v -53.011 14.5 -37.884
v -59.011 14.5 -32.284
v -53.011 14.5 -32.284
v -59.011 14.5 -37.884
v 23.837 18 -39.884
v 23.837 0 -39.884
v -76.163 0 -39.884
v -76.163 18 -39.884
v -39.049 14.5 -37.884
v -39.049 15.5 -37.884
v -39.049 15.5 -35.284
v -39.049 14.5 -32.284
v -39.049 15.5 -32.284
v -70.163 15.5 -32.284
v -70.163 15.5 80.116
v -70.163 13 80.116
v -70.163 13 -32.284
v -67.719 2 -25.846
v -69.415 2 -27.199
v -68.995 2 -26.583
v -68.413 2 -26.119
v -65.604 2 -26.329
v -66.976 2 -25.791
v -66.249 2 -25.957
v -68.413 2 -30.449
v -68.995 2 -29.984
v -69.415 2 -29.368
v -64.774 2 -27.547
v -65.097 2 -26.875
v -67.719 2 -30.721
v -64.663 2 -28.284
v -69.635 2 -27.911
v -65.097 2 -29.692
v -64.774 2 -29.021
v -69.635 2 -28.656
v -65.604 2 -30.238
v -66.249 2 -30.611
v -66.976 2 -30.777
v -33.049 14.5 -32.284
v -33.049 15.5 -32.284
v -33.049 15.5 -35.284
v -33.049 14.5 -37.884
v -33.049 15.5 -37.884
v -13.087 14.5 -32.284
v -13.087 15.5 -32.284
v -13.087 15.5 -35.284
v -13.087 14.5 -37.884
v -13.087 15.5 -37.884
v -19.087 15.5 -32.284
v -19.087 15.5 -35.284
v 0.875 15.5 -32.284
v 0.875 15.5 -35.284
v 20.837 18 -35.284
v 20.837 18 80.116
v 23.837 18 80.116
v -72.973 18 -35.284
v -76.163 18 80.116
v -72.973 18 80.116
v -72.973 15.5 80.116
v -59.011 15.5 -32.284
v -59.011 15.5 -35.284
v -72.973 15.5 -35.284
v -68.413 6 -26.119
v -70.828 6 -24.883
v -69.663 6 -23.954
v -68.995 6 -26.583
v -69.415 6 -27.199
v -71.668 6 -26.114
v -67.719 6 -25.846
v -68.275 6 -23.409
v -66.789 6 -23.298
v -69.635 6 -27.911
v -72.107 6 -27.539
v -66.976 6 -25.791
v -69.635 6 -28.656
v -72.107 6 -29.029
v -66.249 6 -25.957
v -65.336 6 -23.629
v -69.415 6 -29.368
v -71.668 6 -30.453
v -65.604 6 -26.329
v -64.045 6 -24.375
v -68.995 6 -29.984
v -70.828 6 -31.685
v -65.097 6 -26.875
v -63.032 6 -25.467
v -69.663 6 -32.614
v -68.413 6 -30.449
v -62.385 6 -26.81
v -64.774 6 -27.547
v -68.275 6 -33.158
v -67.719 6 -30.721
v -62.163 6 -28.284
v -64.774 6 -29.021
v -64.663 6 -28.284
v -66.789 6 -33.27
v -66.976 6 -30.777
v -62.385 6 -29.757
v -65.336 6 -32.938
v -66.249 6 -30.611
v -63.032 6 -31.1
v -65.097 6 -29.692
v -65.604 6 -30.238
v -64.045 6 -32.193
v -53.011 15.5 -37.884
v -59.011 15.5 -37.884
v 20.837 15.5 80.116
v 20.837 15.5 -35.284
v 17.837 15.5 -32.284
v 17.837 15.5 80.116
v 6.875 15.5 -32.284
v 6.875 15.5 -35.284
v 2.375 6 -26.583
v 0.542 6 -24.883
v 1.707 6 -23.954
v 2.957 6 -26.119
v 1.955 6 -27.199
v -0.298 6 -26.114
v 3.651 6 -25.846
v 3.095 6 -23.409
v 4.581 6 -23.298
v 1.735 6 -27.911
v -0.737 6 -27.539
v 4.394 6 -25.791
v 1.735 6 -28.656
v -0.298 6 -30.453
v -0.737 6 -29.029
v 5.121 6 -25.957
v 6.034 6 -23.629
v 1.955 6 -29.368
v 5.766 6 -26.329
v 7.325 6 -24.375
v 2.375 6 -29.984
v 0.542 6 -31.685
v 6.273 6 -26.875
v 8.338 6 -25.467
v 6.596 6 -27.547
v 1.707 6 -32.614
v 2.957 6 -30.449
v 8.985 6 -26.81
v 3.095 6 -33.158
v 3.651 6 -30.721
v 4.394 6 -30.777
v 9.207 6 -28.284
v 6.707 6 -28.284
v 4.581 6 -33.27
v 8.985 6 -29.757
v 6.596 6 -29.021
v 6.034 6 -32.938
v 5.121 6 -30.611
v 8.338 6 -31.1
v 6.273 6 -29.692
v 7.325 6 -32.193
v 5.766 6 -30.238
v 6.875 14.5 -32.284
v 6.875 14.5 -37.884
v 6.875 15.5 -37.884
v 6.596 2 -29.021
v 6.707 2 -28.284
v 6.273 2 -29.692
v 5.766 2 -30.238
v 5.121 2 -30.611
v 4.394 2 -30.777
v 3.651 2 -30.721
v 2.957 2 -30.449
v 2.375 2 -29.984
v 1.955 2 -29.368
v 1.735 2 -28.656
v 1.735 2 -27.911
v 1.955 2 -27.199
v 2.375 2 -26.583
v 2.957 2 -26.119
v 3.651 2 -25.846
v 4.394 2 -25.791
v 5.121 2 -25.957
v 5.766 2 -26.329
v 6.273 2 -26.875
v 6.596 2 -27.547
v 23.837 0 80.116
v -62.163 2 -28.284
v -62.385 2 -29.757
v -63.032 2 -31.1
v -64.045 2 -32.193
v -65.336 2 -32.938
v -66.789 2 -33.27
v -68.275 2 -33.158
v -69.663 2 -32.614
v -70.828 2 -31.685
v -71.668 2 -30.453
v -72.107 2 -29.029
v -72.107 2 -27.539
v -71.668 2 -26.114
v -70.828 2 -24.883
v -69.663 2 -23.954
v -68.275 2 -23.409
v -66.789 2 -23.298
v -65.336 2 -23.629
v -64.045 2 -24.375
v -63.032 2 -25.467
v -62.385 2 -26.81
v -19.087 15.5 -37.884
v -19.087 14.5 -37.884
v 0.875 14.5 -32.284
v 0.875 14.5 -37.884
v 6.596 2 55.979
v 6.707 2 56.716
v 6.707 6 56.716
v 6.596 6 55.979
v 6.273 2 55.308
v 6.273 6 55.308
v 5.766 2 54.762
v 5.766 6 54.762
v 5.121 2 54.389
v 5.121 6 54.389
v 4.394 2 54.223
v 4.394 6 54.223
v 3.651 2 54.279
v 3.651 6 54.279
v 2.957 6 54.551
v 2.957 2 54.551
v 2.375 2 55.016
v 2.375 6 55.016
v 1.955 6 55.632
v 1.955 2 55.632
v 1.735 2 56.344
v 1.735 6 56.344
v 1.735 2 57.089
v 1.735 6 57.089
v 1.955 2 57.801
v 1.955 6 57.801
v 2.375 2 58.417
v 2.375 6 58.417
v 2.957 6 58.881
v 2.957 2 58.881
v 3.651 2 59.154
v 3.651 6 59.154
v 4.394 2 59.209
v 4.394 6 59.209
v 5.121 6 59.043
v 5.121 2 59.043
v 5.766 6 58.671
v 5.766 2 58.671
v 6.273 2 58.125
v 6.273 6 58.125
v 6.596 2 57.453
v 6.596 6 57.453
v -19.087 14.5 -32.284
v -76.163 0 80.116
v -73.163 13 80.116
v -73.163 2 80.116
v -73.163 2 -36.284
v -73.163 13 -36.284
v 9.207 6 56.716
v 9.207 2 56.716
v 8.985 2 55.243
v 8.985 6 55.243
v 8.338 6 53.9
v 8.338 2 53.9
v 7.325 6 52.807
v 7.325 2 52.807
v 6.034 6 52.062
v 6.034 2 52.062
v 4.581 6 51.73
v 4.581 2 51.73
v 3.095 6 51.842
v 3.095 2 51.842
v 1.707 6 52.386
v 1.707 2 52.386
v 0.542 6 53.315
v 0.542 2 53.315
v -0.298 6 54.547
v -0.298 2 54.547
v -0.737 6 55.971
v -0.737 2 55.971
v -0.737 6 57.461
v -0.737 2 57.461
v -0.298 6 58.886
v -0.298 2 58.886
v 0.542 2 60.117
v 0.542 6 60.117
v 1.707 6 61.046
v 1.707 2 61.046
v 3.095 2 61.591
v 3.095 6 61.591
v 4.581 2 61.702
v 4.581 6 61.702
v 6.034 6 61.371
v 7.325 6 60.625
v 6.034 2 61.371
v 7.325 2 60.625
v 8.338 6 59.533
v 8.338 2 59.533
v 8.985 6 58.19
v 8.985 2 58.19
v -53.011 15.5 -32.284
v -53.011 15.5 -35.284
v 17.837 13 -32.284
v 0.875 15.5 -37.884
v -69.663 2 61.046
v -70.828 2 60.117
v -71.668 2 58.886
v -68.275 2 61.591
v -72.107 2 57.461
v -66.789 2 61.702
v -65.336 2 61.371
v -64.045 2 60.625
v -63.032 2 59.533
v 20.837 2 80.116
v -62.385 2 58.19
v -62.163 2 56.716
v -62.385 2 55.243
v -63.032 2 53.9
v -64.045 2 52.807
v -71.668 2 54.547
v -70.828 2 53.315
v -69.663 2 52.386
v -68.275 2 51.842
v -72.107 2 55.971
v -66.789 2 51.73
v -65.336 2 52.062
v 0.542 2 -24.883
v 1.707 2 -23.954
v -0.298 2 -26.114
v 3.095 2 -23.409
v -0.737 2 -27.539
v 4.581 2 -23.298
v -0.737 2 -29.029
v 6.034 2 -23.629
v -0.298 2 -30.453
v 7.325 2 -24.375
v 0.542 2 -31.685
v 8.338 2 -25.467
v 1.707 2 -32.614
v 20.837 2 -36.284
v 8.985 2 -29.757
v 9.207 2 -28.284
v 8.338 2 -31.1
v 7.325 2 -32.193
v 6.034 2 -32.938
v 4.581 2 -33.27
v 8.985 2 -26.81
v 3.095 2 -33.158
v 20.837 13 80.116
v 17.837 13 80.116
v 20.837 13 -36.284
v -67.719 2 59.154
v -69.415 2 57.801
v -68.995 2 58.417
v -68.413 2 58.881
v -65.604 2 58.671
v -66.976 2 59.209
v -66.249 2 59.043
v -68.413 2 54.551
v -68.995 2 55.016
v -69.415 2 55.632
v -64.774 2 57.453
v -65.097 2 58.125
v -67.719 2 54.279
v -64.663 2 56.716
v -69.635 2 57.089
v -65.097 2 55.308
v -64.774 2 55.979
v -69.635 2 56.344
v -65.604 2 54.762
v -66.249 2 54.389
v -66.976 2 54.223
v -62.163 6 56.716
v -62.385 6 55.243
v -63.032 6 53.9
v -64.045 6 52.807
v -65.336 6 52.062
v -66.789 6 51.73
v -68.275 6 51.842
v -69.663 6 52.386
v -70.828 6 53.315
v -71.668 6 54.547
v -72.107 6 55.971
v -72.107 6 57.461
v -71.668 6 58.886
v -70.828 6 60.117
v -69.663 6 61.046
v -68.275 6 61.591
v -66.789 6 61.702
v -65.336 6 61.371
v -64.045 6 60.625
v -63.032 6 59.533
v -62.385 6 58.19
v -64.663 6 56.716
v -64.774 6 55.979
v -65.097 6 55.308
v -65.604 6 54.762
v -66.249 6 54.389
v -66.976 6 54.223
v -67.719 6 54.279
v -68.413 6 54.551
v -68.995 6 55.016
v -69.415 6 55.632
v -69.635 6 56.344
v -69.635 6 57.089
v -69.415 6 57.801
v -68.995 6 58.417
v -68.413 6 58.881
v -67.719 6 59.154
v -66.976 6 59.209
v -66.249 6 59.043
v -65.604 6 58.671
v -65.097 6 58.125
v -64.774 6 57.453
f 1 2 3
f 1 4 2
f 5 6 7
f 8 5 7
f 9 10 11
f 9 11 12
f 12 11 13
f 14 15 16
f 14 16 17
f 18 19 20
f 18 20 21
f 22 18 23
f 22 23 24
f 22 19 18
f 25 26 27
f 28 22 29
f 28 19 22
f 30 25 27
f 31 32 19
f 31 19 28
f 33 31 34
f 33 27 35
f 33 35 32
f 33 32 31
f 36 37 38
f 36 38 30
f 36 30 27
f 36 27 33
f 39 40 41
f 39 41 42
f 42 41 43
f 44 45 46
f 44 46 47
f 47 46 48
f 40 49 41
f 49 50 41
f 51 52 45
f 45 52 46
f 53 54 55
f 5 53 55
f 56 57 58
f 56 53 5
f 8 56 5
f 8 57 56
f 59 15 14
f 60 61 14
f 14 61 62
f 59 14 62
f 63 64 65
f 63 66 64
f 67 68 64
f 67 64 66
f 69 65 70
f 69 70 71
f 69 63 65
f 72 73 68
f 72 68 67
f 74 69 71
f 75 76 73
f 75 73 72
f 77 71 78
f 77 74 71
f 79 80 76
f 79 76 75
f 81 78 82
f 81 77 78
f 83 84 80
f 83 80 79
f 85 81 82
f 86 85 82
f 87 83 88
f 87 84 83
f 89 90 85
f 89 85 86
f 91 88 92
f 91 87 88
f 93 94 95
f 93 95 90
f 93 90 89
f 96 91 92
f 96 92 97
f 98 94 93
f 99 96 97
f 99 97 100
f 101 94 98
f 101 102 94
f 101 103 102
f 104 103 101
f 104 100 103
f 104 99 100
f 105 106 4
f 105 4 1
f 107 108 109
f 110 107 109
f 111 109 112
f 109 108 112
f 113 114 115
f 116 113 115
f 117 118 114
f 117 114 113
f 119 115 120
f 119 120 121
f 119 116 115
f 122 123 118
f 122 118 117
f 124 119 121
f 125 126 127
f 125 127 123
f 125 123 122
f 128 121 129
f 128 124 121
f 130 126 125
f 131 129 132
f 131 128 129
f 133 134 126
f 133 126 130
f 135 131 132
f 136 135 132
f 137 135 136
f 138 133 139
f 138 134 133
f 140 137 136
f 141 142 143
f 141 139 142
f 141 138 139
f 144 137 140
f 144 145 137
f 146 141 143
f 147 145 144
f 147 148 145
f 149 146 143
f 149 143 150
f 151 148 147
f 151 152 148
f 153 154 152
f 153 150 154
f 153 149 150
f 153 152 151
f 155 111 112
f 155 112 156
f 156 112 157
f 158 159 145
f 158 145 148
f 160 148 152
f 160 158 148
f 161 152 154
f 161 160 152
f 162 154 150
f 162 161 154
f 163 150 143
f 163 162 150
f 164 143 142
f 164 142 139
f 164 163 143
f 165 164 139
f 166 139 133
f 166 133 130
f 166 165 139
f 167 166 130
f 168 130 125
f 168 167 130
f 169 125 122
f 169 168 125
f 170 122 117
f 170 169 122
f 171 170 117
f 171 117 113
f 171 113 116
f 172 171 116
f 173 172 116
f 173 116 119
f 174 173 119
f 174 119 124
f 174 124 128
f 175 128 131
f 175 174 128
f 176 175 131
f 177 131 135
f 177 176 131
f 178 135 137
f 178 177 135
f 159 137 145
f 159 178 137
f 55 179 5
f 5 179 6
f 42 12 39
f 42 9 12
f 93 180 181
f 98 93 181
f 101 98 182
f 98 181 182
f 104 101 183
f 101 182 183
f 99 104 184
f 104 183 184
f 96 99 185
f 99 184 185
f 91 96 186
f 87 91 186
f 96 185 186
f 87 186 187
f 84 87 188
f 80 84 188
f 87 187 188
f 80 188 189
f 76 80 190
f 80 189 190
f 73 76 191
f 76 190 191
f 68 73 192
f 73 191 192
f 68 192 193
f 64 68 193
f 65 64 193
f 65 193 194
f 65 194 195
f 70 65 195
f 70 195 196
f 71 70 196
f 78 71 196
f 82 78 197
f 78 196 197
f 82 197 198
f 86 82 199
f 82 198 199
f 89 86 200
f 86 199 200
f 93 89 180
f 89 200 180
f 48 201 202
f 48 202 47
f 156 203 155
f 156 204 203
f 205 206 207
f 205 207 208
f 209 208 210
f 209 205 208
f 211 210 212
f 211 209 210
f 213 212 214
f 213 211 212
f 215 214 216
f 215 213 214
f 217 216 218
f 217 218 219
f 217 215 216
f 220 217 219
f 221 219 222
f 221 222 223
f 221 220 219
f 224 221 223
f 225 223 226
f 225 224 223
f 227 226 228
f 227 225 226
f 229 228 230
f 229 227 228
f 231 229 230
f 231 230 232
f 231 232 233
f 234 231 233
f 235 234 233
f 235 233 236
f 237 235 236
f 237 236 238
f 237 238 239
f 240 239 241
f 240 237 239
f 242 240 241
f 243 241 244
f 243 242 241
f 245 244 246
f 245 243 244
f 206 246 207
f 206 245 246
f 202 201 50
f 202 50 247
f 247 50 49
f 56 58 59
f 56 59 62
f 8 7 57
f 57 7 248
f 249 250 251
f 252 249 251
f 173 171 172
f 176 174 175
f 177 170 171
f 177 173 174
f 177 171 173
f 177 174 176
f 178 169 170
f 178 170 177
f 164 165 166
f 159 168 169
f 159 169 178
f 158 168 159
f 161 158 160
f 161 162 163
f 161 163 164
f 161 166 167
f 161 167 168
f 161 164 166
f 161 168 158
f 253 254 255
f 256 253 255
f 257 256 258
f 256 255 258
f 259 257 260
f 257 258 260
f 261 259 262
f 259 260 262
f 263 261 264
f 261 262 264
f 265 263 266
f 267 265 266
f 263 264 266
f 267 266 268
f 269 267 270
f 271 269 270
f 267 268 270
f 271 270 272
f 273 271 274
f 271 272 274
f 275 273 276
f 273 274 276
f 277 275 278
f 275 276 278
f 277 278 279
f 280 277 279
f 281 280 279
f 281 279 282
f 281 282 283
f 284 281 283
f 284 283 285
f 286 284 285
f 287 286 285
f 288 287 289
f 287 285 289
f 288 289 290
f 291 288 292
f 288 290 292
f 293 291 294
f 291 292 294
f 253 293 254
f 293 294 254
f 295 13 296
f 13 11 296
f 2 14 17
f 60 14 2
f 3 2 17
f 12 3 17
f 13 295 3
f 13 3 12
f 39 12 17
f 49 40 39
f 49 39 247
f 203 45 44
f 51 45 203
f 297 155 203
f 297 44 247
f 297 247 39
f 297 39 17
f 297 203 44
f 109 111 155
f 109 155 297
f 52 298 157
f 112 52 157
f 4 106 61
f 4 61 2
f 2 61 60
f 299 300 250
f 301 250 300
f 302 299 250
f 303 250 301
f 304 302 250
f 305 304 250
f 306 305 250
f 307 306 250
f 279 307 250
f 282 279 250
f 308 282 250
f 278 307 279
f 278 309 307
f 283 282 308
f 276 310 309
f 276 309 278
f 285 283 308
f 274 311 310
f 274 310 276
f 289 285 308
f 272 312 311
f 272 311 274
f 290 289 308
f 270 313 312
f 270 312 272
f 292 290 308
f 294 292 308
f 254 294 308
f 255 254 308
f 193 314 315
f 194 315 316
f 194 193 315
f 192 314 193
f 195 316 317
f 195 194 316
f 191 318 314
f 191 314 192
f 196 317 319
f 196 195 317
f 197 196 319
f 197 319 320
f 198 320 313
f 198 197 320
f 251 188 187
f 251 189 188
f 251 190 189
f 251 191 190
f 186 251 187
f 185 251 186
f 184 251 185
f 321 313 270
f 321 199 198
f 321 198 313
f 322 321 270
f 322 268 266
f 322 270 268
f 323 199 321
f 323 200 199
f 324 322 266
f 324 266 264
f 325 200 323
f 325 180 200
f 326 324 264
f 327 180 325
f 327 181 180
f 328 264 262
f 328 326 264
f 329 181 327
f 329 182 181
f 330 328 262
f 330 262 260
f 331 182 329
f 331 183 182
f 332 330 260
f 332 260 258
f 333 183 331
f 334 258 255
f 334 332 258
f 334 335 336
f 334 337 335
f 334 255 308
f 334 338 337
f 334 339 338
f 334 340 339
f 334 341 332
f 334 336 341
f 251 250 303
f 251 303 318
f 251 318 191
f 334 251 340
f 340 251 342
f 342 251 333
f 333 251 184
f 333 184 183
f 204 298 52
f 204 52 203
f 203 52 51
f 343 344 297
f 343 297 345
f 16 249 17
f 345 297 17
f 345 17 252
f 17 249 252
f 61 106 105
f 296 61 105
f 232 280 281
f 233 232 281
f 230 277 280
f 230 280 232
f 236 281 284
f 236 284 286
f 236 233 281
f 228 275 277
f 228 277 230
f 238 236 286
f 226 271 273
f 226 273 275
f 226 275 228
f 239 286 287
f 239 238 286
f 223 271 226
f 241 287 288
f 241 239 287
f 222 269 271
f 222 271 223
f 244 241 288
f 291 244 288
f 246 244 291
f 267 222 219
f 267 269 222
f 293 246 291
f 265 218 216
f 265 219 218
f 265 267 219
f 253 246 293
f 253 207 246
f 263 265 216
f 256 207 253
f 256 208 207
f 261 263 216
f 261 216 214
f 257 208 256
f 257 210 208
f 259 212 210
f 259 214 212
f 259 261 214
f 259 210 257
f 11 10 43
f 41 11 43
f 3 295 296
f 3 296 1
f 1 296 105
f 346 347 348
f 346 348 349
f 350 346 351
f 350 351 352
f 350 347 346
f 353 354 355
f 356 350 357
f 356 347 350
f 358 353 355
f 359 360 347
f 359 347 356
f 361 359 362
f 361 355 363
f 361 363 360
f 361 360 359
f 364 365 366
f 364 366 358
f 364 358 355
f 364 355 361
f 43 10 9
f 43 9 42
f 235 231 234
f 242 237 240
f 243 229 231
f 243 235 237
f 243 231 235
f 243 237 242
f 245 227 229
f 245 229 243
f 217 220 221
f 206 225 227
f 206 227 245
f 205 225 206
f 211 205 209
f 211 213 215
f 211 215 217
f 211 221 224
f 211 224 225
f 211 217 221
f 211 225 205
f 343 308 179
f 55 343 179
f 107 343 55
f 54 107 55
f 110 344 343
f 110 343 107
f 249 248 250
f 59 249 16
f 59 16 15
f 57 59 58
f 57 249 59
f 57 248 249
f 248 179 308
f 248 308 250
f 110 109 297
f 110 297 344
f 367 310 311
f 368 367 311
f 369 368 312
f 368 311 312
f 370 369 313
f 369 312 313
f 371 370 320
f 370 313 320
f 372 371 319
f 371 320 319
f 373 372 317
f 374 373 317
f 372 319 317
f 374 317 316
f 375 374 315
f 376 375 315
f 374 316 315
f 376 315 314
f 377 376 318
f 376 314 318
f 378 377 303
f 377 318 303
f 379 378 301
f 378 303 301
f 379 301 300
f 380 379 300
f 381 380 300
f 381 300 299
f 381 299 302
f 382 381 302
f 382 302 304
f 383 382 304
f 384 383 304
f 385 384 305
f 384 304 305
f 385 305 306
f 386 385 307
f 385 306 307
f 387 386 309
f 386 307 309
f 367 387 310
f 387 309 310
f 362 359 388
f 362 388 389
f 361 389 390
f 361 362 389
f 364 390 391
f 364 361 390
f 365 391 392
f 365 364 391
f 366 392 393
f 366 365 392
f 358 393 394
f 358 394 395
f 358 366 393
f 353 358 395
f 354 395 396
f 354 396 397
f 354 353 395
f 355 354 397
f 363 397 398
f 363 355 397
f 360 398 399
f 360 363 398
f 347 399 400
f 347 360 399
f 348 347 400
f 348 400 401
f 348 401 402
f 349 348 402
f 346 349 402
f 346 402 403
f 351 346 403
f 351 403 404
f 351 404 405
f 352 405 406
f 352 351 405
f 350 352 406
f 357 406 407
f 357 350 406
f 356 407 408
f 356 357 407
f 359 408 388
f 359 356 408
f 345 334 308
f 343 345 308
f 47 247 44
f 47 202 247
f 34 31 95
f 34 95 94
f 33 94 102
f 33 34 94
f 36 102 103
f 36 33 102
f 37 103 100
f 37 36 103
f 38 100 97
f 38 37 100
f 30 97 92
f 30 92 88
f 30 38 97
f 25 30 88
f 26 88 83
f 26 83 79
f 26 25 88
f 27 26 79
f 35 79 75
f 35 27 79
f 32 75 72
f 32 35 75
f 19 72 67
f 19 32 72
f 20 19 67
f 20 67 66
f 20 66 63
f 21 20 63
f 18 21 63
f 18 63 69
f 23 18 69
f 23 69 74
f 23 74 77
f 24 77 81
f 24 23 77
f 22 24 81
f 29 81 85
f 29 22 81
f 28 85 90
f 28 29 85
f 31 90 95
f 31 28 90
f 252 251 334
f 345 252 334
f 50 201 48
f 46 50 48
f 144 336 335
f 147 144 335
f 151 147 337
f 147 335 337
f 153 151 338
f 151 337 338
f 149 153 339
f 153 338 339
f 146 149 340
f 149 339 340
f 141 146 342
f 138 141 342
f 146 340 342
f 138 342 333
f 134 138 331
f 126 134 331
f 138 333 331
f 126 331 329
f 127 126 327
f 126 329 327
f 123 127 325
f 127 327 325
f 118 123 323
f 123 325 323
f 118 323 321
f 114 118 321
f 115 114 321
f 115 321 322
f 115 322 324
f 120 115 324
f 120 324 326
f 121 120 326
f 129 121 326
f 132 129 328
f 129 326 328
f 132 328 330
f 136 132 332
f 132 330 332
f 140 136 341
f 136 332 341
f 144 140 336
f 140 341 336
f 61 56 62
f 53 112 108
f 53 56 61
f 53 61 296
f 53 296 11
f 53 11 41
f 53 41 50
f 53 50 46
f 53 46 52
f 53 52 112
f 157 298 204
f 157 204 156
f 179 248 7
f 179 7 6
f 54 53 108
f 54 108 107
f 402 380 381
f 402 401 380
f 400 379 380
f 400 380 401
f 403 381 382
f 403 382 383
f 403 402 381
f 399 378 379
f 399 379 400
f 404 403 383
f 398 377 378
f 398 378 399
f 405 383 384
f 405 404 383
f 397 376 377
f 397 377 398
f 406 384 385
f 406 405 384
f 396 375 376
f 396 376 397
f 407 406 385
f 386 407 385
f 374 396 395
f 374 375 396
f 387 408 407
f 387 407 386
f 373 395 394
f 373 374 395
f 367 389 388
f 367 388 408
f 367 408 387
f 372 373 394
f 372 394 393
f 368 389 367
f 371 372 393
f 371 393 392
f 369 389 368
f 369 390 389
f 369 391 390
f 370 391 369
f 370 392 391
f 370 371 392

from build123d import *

# Parameters (mm, degrees)
SZKIC1_W                    = 100
SZKIC1_H                    = 120
DODANIE_WYCI_GNI_CIE3_DEPTH = 2
SZKIC3_R                    = 5
SZKIC3_R_2                  = 2.5
DODANIE_WYCI_GNI_CIE4_DEPTH = 4
DODANIE_WYCI_GNI_CIE5_DEPTH = 16
SZKIC6_W                    = 94
SZKIC6_H                    = 5
DODANIE_WYCI_GNI_CIE6_DEPTH = 4
SZKIC7_W                    = 112.4
SZKIC7_H                    = 5
DODANIE_WYCI_GNI_CIE7_DEPTH = 3
SZKIC8_W                    = 112.4
SZKIC8_H                    = 5
DODANIE_WYCI_GNI_CIE8_DEPTH = 3
WYTNIJ_WYCI_GNI_CIE1_DEPTH  = 2.5
SZKIC11_W                   = 6
SZKIC11_H                   = 3
SZKIC11_H_2                 = 2.6
WYTNIJ_WYCI_GNI_CIE3_DEPTH  = 1


with BuildPart() as part:
    # Szkic1 → Dodanie-wyciągnięcie3 (new body)
    with BuildSketch(Plane(origin=(0, 0, 0), x_dir=(1, 0, 0), z_dir=(0, 1, 0))):
        with Locations((-26.162790698, -20.11627907)):
            Rectangle(SZKIC1_W, SZKIC1_H)
    extrude(amount=DODANIE_WYCI_GNI_CIE3_DEPTH)

    # Szkic3 → Dodanie-wyciągnięcie4 (add)
    with BuildSketch(Plane(origin=(0, 2, 0), x_dir=(1, 0, 0), z_dir=(0, 1, 0))):
        with Locations((-67.162790698, 28.28372093)):
            Circle(SZKIC3_R)
        with Locations((-67.162790698, 28.28372093)):
            Circle(SZKIC3_R_2, mode=Mode.SUBTRACT)
        with Locations((4.207209302, 28.28372093)):
            Circle(SZKIC3_R)
        with Locations((4.207209302, 28.28372093)):
            Circle(SZKIC3_R_2, mode=Mode.SUBTRACT)
        with Locations((4.207209302, -56.71627907)):
            Circle(SZKIC3_R)
        with Locations((4.207209302, -56.71627907)):
            Circle(SZKIC3_R_2, mode=Mode.SUBTRACT)
        with Locations((-67.162790698, -56.71627907)):
            Circle(SZKIC3_R)
        with Locations((-67.162790698, -56.71627907)):
            Circle(SZKIC3_R_2, mode=Mode.SUBTRACT)
    extrude(amount=DODANIE_WYCI_GNI_CIE4_DEPTH)

    # Szkic4 → Dodanie-wyciągnięcie5 (add)
    with BuildSketch(Plane(origin=(0, 2, 0), x_dir=(1, 0, 0), z_dir=(0, 1, 0))):
        Polygon((-76.162790698, 39.88372093), (-76.162790698, -80.11627907), (-73.162790698, -80.11627907), (-73.162790698, -76.51627907), (-73.162790698, 36.28372093), (20.837209302, 36.28372093), (20.837209302, -76.51627907), (20.837209302, -80.11627907), (23.837209302, -80.11627907), (23.837209302, 39.88372093), align=None)
    extrude(amount=DODANIE_WYCI_GNI_CIE5_DEPTH)

    # Szkic6 → Dodanie-wyciągnięcie6 (add)
    with BuildSketch(Plane.XY.offset(-36.28372093)):
        with Locations((-26.162790698, 15.5)):
            Rectangle(SZKIC6_W, SZKIC6_H)
    extrude(amount=DODANIE_WYCI_GNI_CIE6_DEPTH)

    # Szkic7 → Dodanie-wyciągnięcie7 (add)
    with BuildSketch(Plane.ZY.offset(-20.837209302)):
        with Locations((23.91627907, 15.5)):
            Rectangle(SZKIC7_W, SZKIC7_H)
    extrude(amount=DODANIE_WYCI_GNI_CIE7_DEPTH)

    # Szkic8 → Dodanie-wyciągnięcie8 (add)
    with BuildSketch(Plane(origin=(-73.162790698, 0, 0), x_dir=(0, 0, -1), z_dir=(1, 0, 0))):
        with Locations((-23.91627907, 15.5)):
            Rectangle(SZKIC8_W, SZKIC8_H)
    extrude(amount=DODANIE_WYCI_GNI_CIE8_DEPTH)

    # Szkic10 → Wytnij-wyciągnięcie1 (cut)
    with BuildSketch(Plane(origin=(0, 18, 0), x_dir=(1, 0, 0), z_dir=(0, 1, 0))):
        Polygon((-70.162790698, -80.11627907), (-72.972722391, -80.11627907), (-72.972722391, 35.28372093), (20.837209302, 35.28372093), (20.837209302, -80.11627907), (17.837209302, -80.11627907), (17.837209302, 32.28372093), (-70.162790698, 32.28372093), align=None)
    extrude(amount=-WYTNIJ_WYCI_GNI_CIE1_DEPTH, mode=Mode.SUBTRACT)

    # Szkic11 → Wytnij-wyciągnięcie3 (cut)
    with BuildSketch(Plane(origin=(0, 15.5, 0), x_dir=(1, 0, 0), z_dir=(0, 1, 0))):
        with Locations((-56.010736052, 33.78372093)):
            Rectangle(SZKIC11_W, SZKIC11_H)
        with Locations((-56.010736052, 36.58372093)):
            Rectangle(SZKIC11_W, SZKIC11_H_2)
        with Locations((-36.048749714, 33.78372093)):
            Rectangle(SZKIC11_W, SZKIC11_H)
        with Locations((-36.048749714, 36.58372093)):
            Rectangle(SZKIC11_W, SZKIC11_H_2)
        with Locations((-16.086763375, 33.78372093)):
            Rectangle(SZKIC11_W, SZKIC11_H)
        with Locations((-16.086763375, 36.58372093)):
            Rectangle(SZKIC11_W, SZKIC11_H_2)
        with Locations((3.875222964, 33.78372093)):
            Rectangle(SZKIC11_W, SZKIC11_H)
        with Locations((3.875222964, 36.58372093)):
            Rectangle(SZKIC11_W, SZKIC11_H_2)
    extrude(amount=-WYTNIJ_WYCI_GNI_CIE3_DEPTH, mode=Mode.SUBTRACT)


solid = part.part
